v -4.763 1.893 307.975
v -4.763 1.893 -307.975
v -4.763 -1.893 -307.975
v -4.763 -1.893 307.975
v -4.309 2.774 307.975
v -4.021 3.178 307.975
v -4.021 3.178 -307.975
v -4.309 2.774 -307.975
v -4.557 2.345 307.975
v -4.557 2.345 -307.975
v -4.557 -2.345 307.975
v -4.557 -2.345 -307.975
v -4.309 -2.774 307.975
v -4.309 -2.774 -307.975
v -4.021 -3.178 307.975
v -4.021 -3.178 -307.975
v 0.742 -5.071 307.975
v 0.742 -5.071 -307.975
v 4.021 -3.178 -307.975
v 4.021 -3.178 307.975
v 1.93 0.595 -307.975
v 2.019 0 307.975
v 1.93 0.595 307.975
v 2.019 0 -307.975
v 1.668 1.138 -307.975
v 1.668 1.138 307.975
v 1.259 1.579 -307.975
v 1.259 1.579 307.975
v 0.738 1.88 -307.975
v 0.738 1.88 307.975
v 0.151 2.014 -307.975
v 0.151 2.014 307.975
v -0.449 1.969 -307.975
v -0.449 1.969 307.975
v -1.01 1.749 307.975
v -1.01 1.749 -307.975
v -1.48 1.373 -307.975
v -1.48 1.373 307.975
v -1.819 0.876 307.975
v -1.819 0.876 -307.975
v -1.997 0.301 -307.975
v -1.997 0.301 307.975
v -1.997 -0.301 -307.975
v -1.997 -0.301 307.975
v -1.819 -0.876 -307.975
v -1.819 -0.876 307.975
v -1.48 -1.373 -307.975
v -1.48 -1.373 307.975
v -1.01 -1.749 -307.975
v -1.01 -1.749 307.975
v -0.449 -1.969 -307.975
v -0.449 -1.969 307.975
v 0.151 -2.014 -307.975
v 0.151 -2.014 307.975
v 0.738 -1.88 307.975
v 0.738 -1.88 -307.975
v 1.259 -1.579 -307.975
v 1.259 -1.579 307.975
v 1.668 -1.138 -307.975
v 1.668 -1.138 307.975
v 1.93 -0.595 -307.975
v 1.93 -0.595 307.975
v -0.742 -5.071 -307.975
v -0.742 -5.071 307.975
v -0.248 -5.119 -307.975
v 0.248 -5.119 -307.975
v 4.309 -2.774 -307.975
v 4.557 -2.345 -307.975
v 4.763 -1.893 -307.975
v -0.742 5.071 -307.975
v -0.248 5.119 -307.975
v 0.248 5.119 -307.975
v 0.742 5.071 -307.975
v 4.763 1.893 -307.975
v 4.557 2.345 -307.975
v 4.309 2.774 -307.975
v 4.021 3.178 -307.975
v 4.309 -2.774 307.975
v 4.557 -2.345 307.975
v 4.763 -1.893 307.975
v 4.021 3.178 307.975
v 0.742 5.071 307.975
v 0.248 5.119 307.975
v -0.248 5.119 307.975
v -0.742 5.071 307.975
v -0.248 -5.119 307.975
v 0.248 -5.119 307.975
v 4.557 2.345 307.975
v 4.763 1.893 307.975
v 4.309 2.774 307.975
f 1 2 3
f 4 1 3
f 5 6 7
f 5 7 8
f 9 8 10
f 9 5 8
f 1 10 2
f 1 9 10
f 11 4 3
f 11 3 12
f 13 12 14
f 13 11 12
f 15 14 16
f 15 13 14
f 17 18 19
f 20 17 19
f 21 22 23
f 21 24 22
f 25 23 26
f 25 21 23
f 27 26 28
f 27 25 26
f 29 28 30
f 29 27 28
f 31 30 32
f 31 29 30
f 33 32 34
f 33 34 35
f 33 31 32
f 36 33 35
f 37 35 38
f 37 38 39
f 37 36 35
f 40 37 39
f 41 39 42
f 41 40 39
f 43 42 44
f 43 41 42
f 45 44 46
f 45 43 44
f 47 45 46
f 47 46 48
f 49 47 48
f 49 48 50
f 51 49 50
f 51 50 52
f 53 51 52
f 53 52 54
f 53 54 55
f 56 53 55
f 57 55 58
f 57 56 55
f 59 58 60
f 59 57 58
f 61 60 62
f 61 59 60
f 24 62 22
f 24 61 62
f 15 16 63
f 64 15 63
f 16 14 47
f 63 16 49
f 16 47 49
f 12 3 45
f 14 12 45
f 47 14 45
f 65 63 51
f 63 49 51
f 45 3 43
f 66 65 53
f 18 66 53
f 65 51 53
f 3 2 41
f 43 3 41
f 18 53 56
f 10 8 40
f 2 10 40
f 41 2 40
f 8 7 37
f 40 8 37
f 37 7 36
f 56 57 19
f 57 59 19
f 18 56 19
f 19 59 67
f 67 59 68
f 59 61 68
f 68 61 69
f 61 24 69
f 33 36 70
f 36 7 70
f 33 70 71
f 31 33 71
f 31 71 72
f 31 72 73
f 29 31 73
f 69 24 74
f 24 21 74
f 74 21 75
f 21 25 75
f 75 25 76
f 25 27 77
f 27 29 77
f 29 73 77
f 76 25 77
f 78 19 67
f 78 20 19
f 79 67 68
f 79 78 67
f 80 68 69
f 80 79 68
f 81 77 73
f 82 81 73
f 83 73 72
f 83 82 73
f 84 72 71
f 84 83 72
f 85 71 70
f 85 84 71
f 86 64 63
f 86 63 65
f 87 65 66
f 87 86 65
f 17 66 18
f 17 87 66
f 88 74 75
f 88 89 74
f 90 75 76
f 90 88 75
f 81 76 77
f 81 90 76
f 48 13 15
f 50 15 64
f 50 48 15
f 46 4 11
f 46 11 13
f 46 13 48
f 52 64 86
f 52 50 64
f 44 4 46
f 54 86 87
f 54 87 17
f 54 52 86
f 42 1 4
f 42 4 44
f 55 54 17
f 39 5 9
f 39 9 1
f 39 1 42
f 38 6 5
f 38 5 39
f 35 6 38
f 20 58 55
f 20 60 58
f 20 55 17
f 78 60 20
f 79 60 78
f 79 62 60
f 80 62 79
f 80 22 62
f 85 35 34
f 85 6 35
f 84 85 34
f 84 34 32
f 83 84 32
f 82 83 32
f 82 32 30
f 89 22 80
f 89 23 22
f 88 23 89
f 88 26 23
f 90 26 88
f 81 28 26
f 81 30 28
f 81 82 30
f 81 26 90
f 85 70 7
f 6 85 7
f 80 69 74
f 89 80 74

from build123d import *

# Parameters (mm, degrees)
SKETCH2_R                            = 2.0193
BOSS_EXTRUDE1_DEPTH                  = 307.975
F_10_32_TAPPED_HOLE2_D               = 4.0386
F_10_32_TAPPED_HOLE2_DEPTH           = 16.34744
F_10_32_TAPPED_HOLE2_TIP             = 1.213317848
F_10_32_TAPPED_HOLE2_ON_FACE_2_D     = 4.0386
F_10_32_TAPPED_HOLE2_ON_FACE_2_DEPTH = 16.34744
F_10_32_TAPPED_HOLE2_ON_FACE_2_TIP   = 1.213317848


with BuildPart() as part:
    # Sketch2 → Boss-Extrude1 (new, symmetric)
    with BuildSketch(Plane.XY):
        with BuildLine():
            ThreePointArc((0.741687758, 5.071047688), (0, 5.125000037), (-0.741687758, 5.071047688))
            Line((-0.741687758, 5.071047688), (-4.020812242, 3.177844283))
            ThreePointArc((-4.020812242, 3.177844283), (-4.438380226, 2.562500019), (-4.7625, 1.893203404))
            Line((-4.7625, 1.893203404), (-4.7625, -1.893203404))
            ThreePointArc((-4.7625, -1.893203404), (-4.438380226, -2.562500019), (-4.020812242, -3.177844283))
            Line((-4.020812242, -3.177844283), (-0.741687758, -5.071047688))
            ThreePointArc((-0.741687758, -5.071047688), (0, -5.125000037), (0.741687758, -5.071047688))
            Line((0.741687758, -5.071047688), (4.020812242, -3.177844283))
            ThreePointArc((4.020812242, -3.177844283), (4.438380226, -2.562500019), (4.7625, -1.893203404))
            Line((4.7625, -1.893203404), (4.7625, 1.893203404))
            ThreePointArc((4.7625, 1.893203404), (4.438380226, 2.562500019), (4.020812242, 3.177844283))
            Line((4.020812242, 3.177844283), (0.741687758, 5.071047688))
        make_face()
        Circle(SKETCH2_R, mode=Mode.SUBTRACT)
    extrude(amount=BOSS_EXTRUDE1_DEPTH, both=True)

    # #10-32 Tapped Hole2
    with Locations(Plane(origin=(0, 0, -307.975), x_dir=(-1, 0, 0), z_dir=(0, 0, -1))):
        with Locations((0, 0)):
            Hole(F_10_32_TAPPED_HOLE2_D / 2, depth=F_10_32_TAPPED_HOLE2_DEPTH)
            with Locations((0, 0, -(F_10_32_TAPPED_HOLE2_DEPTH + F_10_32_TAPPED_HOLE2_TIP / 2))):  # 118° drill point
                Cone(0, F_10_32_TAPPED_HOLE2_D / 2, F_10_32_TAPPED_HOLE2_TIP, mode=Mode.SUBTRACT)

    # #10-32 Tapped Hole2 on face 2
    with Locations(Plane(origin=(0, 0, 307.975), x_dir=(-1, 0, 0), z_dir=(0, 0, -1))):
        with Locations((0, 0)):
            Hole(F_10_32_TAPPED_HOLE2_ON_FACE_2_D / 2, depth=F_10_32_TAPPED_HOLE2_ON_FACE_2_DEPTH)
            with Locations((0, 0, -(F_10_32_TAPPED_HOLE2_ON_FACE_2_DEPTH + F_10_32_TAPPED_HOLE2_ON_FACE_2_TIP / 2))):  # 118° drill point
                Cone(0, F_10_32_TAPPED_HOLE2_ON_FACE_2_D / 2, F_10_32_TAPPED_HOLE2_ON_FACE_2_TIP, mode=Mode.SUBTRACT)


solid = part.part
